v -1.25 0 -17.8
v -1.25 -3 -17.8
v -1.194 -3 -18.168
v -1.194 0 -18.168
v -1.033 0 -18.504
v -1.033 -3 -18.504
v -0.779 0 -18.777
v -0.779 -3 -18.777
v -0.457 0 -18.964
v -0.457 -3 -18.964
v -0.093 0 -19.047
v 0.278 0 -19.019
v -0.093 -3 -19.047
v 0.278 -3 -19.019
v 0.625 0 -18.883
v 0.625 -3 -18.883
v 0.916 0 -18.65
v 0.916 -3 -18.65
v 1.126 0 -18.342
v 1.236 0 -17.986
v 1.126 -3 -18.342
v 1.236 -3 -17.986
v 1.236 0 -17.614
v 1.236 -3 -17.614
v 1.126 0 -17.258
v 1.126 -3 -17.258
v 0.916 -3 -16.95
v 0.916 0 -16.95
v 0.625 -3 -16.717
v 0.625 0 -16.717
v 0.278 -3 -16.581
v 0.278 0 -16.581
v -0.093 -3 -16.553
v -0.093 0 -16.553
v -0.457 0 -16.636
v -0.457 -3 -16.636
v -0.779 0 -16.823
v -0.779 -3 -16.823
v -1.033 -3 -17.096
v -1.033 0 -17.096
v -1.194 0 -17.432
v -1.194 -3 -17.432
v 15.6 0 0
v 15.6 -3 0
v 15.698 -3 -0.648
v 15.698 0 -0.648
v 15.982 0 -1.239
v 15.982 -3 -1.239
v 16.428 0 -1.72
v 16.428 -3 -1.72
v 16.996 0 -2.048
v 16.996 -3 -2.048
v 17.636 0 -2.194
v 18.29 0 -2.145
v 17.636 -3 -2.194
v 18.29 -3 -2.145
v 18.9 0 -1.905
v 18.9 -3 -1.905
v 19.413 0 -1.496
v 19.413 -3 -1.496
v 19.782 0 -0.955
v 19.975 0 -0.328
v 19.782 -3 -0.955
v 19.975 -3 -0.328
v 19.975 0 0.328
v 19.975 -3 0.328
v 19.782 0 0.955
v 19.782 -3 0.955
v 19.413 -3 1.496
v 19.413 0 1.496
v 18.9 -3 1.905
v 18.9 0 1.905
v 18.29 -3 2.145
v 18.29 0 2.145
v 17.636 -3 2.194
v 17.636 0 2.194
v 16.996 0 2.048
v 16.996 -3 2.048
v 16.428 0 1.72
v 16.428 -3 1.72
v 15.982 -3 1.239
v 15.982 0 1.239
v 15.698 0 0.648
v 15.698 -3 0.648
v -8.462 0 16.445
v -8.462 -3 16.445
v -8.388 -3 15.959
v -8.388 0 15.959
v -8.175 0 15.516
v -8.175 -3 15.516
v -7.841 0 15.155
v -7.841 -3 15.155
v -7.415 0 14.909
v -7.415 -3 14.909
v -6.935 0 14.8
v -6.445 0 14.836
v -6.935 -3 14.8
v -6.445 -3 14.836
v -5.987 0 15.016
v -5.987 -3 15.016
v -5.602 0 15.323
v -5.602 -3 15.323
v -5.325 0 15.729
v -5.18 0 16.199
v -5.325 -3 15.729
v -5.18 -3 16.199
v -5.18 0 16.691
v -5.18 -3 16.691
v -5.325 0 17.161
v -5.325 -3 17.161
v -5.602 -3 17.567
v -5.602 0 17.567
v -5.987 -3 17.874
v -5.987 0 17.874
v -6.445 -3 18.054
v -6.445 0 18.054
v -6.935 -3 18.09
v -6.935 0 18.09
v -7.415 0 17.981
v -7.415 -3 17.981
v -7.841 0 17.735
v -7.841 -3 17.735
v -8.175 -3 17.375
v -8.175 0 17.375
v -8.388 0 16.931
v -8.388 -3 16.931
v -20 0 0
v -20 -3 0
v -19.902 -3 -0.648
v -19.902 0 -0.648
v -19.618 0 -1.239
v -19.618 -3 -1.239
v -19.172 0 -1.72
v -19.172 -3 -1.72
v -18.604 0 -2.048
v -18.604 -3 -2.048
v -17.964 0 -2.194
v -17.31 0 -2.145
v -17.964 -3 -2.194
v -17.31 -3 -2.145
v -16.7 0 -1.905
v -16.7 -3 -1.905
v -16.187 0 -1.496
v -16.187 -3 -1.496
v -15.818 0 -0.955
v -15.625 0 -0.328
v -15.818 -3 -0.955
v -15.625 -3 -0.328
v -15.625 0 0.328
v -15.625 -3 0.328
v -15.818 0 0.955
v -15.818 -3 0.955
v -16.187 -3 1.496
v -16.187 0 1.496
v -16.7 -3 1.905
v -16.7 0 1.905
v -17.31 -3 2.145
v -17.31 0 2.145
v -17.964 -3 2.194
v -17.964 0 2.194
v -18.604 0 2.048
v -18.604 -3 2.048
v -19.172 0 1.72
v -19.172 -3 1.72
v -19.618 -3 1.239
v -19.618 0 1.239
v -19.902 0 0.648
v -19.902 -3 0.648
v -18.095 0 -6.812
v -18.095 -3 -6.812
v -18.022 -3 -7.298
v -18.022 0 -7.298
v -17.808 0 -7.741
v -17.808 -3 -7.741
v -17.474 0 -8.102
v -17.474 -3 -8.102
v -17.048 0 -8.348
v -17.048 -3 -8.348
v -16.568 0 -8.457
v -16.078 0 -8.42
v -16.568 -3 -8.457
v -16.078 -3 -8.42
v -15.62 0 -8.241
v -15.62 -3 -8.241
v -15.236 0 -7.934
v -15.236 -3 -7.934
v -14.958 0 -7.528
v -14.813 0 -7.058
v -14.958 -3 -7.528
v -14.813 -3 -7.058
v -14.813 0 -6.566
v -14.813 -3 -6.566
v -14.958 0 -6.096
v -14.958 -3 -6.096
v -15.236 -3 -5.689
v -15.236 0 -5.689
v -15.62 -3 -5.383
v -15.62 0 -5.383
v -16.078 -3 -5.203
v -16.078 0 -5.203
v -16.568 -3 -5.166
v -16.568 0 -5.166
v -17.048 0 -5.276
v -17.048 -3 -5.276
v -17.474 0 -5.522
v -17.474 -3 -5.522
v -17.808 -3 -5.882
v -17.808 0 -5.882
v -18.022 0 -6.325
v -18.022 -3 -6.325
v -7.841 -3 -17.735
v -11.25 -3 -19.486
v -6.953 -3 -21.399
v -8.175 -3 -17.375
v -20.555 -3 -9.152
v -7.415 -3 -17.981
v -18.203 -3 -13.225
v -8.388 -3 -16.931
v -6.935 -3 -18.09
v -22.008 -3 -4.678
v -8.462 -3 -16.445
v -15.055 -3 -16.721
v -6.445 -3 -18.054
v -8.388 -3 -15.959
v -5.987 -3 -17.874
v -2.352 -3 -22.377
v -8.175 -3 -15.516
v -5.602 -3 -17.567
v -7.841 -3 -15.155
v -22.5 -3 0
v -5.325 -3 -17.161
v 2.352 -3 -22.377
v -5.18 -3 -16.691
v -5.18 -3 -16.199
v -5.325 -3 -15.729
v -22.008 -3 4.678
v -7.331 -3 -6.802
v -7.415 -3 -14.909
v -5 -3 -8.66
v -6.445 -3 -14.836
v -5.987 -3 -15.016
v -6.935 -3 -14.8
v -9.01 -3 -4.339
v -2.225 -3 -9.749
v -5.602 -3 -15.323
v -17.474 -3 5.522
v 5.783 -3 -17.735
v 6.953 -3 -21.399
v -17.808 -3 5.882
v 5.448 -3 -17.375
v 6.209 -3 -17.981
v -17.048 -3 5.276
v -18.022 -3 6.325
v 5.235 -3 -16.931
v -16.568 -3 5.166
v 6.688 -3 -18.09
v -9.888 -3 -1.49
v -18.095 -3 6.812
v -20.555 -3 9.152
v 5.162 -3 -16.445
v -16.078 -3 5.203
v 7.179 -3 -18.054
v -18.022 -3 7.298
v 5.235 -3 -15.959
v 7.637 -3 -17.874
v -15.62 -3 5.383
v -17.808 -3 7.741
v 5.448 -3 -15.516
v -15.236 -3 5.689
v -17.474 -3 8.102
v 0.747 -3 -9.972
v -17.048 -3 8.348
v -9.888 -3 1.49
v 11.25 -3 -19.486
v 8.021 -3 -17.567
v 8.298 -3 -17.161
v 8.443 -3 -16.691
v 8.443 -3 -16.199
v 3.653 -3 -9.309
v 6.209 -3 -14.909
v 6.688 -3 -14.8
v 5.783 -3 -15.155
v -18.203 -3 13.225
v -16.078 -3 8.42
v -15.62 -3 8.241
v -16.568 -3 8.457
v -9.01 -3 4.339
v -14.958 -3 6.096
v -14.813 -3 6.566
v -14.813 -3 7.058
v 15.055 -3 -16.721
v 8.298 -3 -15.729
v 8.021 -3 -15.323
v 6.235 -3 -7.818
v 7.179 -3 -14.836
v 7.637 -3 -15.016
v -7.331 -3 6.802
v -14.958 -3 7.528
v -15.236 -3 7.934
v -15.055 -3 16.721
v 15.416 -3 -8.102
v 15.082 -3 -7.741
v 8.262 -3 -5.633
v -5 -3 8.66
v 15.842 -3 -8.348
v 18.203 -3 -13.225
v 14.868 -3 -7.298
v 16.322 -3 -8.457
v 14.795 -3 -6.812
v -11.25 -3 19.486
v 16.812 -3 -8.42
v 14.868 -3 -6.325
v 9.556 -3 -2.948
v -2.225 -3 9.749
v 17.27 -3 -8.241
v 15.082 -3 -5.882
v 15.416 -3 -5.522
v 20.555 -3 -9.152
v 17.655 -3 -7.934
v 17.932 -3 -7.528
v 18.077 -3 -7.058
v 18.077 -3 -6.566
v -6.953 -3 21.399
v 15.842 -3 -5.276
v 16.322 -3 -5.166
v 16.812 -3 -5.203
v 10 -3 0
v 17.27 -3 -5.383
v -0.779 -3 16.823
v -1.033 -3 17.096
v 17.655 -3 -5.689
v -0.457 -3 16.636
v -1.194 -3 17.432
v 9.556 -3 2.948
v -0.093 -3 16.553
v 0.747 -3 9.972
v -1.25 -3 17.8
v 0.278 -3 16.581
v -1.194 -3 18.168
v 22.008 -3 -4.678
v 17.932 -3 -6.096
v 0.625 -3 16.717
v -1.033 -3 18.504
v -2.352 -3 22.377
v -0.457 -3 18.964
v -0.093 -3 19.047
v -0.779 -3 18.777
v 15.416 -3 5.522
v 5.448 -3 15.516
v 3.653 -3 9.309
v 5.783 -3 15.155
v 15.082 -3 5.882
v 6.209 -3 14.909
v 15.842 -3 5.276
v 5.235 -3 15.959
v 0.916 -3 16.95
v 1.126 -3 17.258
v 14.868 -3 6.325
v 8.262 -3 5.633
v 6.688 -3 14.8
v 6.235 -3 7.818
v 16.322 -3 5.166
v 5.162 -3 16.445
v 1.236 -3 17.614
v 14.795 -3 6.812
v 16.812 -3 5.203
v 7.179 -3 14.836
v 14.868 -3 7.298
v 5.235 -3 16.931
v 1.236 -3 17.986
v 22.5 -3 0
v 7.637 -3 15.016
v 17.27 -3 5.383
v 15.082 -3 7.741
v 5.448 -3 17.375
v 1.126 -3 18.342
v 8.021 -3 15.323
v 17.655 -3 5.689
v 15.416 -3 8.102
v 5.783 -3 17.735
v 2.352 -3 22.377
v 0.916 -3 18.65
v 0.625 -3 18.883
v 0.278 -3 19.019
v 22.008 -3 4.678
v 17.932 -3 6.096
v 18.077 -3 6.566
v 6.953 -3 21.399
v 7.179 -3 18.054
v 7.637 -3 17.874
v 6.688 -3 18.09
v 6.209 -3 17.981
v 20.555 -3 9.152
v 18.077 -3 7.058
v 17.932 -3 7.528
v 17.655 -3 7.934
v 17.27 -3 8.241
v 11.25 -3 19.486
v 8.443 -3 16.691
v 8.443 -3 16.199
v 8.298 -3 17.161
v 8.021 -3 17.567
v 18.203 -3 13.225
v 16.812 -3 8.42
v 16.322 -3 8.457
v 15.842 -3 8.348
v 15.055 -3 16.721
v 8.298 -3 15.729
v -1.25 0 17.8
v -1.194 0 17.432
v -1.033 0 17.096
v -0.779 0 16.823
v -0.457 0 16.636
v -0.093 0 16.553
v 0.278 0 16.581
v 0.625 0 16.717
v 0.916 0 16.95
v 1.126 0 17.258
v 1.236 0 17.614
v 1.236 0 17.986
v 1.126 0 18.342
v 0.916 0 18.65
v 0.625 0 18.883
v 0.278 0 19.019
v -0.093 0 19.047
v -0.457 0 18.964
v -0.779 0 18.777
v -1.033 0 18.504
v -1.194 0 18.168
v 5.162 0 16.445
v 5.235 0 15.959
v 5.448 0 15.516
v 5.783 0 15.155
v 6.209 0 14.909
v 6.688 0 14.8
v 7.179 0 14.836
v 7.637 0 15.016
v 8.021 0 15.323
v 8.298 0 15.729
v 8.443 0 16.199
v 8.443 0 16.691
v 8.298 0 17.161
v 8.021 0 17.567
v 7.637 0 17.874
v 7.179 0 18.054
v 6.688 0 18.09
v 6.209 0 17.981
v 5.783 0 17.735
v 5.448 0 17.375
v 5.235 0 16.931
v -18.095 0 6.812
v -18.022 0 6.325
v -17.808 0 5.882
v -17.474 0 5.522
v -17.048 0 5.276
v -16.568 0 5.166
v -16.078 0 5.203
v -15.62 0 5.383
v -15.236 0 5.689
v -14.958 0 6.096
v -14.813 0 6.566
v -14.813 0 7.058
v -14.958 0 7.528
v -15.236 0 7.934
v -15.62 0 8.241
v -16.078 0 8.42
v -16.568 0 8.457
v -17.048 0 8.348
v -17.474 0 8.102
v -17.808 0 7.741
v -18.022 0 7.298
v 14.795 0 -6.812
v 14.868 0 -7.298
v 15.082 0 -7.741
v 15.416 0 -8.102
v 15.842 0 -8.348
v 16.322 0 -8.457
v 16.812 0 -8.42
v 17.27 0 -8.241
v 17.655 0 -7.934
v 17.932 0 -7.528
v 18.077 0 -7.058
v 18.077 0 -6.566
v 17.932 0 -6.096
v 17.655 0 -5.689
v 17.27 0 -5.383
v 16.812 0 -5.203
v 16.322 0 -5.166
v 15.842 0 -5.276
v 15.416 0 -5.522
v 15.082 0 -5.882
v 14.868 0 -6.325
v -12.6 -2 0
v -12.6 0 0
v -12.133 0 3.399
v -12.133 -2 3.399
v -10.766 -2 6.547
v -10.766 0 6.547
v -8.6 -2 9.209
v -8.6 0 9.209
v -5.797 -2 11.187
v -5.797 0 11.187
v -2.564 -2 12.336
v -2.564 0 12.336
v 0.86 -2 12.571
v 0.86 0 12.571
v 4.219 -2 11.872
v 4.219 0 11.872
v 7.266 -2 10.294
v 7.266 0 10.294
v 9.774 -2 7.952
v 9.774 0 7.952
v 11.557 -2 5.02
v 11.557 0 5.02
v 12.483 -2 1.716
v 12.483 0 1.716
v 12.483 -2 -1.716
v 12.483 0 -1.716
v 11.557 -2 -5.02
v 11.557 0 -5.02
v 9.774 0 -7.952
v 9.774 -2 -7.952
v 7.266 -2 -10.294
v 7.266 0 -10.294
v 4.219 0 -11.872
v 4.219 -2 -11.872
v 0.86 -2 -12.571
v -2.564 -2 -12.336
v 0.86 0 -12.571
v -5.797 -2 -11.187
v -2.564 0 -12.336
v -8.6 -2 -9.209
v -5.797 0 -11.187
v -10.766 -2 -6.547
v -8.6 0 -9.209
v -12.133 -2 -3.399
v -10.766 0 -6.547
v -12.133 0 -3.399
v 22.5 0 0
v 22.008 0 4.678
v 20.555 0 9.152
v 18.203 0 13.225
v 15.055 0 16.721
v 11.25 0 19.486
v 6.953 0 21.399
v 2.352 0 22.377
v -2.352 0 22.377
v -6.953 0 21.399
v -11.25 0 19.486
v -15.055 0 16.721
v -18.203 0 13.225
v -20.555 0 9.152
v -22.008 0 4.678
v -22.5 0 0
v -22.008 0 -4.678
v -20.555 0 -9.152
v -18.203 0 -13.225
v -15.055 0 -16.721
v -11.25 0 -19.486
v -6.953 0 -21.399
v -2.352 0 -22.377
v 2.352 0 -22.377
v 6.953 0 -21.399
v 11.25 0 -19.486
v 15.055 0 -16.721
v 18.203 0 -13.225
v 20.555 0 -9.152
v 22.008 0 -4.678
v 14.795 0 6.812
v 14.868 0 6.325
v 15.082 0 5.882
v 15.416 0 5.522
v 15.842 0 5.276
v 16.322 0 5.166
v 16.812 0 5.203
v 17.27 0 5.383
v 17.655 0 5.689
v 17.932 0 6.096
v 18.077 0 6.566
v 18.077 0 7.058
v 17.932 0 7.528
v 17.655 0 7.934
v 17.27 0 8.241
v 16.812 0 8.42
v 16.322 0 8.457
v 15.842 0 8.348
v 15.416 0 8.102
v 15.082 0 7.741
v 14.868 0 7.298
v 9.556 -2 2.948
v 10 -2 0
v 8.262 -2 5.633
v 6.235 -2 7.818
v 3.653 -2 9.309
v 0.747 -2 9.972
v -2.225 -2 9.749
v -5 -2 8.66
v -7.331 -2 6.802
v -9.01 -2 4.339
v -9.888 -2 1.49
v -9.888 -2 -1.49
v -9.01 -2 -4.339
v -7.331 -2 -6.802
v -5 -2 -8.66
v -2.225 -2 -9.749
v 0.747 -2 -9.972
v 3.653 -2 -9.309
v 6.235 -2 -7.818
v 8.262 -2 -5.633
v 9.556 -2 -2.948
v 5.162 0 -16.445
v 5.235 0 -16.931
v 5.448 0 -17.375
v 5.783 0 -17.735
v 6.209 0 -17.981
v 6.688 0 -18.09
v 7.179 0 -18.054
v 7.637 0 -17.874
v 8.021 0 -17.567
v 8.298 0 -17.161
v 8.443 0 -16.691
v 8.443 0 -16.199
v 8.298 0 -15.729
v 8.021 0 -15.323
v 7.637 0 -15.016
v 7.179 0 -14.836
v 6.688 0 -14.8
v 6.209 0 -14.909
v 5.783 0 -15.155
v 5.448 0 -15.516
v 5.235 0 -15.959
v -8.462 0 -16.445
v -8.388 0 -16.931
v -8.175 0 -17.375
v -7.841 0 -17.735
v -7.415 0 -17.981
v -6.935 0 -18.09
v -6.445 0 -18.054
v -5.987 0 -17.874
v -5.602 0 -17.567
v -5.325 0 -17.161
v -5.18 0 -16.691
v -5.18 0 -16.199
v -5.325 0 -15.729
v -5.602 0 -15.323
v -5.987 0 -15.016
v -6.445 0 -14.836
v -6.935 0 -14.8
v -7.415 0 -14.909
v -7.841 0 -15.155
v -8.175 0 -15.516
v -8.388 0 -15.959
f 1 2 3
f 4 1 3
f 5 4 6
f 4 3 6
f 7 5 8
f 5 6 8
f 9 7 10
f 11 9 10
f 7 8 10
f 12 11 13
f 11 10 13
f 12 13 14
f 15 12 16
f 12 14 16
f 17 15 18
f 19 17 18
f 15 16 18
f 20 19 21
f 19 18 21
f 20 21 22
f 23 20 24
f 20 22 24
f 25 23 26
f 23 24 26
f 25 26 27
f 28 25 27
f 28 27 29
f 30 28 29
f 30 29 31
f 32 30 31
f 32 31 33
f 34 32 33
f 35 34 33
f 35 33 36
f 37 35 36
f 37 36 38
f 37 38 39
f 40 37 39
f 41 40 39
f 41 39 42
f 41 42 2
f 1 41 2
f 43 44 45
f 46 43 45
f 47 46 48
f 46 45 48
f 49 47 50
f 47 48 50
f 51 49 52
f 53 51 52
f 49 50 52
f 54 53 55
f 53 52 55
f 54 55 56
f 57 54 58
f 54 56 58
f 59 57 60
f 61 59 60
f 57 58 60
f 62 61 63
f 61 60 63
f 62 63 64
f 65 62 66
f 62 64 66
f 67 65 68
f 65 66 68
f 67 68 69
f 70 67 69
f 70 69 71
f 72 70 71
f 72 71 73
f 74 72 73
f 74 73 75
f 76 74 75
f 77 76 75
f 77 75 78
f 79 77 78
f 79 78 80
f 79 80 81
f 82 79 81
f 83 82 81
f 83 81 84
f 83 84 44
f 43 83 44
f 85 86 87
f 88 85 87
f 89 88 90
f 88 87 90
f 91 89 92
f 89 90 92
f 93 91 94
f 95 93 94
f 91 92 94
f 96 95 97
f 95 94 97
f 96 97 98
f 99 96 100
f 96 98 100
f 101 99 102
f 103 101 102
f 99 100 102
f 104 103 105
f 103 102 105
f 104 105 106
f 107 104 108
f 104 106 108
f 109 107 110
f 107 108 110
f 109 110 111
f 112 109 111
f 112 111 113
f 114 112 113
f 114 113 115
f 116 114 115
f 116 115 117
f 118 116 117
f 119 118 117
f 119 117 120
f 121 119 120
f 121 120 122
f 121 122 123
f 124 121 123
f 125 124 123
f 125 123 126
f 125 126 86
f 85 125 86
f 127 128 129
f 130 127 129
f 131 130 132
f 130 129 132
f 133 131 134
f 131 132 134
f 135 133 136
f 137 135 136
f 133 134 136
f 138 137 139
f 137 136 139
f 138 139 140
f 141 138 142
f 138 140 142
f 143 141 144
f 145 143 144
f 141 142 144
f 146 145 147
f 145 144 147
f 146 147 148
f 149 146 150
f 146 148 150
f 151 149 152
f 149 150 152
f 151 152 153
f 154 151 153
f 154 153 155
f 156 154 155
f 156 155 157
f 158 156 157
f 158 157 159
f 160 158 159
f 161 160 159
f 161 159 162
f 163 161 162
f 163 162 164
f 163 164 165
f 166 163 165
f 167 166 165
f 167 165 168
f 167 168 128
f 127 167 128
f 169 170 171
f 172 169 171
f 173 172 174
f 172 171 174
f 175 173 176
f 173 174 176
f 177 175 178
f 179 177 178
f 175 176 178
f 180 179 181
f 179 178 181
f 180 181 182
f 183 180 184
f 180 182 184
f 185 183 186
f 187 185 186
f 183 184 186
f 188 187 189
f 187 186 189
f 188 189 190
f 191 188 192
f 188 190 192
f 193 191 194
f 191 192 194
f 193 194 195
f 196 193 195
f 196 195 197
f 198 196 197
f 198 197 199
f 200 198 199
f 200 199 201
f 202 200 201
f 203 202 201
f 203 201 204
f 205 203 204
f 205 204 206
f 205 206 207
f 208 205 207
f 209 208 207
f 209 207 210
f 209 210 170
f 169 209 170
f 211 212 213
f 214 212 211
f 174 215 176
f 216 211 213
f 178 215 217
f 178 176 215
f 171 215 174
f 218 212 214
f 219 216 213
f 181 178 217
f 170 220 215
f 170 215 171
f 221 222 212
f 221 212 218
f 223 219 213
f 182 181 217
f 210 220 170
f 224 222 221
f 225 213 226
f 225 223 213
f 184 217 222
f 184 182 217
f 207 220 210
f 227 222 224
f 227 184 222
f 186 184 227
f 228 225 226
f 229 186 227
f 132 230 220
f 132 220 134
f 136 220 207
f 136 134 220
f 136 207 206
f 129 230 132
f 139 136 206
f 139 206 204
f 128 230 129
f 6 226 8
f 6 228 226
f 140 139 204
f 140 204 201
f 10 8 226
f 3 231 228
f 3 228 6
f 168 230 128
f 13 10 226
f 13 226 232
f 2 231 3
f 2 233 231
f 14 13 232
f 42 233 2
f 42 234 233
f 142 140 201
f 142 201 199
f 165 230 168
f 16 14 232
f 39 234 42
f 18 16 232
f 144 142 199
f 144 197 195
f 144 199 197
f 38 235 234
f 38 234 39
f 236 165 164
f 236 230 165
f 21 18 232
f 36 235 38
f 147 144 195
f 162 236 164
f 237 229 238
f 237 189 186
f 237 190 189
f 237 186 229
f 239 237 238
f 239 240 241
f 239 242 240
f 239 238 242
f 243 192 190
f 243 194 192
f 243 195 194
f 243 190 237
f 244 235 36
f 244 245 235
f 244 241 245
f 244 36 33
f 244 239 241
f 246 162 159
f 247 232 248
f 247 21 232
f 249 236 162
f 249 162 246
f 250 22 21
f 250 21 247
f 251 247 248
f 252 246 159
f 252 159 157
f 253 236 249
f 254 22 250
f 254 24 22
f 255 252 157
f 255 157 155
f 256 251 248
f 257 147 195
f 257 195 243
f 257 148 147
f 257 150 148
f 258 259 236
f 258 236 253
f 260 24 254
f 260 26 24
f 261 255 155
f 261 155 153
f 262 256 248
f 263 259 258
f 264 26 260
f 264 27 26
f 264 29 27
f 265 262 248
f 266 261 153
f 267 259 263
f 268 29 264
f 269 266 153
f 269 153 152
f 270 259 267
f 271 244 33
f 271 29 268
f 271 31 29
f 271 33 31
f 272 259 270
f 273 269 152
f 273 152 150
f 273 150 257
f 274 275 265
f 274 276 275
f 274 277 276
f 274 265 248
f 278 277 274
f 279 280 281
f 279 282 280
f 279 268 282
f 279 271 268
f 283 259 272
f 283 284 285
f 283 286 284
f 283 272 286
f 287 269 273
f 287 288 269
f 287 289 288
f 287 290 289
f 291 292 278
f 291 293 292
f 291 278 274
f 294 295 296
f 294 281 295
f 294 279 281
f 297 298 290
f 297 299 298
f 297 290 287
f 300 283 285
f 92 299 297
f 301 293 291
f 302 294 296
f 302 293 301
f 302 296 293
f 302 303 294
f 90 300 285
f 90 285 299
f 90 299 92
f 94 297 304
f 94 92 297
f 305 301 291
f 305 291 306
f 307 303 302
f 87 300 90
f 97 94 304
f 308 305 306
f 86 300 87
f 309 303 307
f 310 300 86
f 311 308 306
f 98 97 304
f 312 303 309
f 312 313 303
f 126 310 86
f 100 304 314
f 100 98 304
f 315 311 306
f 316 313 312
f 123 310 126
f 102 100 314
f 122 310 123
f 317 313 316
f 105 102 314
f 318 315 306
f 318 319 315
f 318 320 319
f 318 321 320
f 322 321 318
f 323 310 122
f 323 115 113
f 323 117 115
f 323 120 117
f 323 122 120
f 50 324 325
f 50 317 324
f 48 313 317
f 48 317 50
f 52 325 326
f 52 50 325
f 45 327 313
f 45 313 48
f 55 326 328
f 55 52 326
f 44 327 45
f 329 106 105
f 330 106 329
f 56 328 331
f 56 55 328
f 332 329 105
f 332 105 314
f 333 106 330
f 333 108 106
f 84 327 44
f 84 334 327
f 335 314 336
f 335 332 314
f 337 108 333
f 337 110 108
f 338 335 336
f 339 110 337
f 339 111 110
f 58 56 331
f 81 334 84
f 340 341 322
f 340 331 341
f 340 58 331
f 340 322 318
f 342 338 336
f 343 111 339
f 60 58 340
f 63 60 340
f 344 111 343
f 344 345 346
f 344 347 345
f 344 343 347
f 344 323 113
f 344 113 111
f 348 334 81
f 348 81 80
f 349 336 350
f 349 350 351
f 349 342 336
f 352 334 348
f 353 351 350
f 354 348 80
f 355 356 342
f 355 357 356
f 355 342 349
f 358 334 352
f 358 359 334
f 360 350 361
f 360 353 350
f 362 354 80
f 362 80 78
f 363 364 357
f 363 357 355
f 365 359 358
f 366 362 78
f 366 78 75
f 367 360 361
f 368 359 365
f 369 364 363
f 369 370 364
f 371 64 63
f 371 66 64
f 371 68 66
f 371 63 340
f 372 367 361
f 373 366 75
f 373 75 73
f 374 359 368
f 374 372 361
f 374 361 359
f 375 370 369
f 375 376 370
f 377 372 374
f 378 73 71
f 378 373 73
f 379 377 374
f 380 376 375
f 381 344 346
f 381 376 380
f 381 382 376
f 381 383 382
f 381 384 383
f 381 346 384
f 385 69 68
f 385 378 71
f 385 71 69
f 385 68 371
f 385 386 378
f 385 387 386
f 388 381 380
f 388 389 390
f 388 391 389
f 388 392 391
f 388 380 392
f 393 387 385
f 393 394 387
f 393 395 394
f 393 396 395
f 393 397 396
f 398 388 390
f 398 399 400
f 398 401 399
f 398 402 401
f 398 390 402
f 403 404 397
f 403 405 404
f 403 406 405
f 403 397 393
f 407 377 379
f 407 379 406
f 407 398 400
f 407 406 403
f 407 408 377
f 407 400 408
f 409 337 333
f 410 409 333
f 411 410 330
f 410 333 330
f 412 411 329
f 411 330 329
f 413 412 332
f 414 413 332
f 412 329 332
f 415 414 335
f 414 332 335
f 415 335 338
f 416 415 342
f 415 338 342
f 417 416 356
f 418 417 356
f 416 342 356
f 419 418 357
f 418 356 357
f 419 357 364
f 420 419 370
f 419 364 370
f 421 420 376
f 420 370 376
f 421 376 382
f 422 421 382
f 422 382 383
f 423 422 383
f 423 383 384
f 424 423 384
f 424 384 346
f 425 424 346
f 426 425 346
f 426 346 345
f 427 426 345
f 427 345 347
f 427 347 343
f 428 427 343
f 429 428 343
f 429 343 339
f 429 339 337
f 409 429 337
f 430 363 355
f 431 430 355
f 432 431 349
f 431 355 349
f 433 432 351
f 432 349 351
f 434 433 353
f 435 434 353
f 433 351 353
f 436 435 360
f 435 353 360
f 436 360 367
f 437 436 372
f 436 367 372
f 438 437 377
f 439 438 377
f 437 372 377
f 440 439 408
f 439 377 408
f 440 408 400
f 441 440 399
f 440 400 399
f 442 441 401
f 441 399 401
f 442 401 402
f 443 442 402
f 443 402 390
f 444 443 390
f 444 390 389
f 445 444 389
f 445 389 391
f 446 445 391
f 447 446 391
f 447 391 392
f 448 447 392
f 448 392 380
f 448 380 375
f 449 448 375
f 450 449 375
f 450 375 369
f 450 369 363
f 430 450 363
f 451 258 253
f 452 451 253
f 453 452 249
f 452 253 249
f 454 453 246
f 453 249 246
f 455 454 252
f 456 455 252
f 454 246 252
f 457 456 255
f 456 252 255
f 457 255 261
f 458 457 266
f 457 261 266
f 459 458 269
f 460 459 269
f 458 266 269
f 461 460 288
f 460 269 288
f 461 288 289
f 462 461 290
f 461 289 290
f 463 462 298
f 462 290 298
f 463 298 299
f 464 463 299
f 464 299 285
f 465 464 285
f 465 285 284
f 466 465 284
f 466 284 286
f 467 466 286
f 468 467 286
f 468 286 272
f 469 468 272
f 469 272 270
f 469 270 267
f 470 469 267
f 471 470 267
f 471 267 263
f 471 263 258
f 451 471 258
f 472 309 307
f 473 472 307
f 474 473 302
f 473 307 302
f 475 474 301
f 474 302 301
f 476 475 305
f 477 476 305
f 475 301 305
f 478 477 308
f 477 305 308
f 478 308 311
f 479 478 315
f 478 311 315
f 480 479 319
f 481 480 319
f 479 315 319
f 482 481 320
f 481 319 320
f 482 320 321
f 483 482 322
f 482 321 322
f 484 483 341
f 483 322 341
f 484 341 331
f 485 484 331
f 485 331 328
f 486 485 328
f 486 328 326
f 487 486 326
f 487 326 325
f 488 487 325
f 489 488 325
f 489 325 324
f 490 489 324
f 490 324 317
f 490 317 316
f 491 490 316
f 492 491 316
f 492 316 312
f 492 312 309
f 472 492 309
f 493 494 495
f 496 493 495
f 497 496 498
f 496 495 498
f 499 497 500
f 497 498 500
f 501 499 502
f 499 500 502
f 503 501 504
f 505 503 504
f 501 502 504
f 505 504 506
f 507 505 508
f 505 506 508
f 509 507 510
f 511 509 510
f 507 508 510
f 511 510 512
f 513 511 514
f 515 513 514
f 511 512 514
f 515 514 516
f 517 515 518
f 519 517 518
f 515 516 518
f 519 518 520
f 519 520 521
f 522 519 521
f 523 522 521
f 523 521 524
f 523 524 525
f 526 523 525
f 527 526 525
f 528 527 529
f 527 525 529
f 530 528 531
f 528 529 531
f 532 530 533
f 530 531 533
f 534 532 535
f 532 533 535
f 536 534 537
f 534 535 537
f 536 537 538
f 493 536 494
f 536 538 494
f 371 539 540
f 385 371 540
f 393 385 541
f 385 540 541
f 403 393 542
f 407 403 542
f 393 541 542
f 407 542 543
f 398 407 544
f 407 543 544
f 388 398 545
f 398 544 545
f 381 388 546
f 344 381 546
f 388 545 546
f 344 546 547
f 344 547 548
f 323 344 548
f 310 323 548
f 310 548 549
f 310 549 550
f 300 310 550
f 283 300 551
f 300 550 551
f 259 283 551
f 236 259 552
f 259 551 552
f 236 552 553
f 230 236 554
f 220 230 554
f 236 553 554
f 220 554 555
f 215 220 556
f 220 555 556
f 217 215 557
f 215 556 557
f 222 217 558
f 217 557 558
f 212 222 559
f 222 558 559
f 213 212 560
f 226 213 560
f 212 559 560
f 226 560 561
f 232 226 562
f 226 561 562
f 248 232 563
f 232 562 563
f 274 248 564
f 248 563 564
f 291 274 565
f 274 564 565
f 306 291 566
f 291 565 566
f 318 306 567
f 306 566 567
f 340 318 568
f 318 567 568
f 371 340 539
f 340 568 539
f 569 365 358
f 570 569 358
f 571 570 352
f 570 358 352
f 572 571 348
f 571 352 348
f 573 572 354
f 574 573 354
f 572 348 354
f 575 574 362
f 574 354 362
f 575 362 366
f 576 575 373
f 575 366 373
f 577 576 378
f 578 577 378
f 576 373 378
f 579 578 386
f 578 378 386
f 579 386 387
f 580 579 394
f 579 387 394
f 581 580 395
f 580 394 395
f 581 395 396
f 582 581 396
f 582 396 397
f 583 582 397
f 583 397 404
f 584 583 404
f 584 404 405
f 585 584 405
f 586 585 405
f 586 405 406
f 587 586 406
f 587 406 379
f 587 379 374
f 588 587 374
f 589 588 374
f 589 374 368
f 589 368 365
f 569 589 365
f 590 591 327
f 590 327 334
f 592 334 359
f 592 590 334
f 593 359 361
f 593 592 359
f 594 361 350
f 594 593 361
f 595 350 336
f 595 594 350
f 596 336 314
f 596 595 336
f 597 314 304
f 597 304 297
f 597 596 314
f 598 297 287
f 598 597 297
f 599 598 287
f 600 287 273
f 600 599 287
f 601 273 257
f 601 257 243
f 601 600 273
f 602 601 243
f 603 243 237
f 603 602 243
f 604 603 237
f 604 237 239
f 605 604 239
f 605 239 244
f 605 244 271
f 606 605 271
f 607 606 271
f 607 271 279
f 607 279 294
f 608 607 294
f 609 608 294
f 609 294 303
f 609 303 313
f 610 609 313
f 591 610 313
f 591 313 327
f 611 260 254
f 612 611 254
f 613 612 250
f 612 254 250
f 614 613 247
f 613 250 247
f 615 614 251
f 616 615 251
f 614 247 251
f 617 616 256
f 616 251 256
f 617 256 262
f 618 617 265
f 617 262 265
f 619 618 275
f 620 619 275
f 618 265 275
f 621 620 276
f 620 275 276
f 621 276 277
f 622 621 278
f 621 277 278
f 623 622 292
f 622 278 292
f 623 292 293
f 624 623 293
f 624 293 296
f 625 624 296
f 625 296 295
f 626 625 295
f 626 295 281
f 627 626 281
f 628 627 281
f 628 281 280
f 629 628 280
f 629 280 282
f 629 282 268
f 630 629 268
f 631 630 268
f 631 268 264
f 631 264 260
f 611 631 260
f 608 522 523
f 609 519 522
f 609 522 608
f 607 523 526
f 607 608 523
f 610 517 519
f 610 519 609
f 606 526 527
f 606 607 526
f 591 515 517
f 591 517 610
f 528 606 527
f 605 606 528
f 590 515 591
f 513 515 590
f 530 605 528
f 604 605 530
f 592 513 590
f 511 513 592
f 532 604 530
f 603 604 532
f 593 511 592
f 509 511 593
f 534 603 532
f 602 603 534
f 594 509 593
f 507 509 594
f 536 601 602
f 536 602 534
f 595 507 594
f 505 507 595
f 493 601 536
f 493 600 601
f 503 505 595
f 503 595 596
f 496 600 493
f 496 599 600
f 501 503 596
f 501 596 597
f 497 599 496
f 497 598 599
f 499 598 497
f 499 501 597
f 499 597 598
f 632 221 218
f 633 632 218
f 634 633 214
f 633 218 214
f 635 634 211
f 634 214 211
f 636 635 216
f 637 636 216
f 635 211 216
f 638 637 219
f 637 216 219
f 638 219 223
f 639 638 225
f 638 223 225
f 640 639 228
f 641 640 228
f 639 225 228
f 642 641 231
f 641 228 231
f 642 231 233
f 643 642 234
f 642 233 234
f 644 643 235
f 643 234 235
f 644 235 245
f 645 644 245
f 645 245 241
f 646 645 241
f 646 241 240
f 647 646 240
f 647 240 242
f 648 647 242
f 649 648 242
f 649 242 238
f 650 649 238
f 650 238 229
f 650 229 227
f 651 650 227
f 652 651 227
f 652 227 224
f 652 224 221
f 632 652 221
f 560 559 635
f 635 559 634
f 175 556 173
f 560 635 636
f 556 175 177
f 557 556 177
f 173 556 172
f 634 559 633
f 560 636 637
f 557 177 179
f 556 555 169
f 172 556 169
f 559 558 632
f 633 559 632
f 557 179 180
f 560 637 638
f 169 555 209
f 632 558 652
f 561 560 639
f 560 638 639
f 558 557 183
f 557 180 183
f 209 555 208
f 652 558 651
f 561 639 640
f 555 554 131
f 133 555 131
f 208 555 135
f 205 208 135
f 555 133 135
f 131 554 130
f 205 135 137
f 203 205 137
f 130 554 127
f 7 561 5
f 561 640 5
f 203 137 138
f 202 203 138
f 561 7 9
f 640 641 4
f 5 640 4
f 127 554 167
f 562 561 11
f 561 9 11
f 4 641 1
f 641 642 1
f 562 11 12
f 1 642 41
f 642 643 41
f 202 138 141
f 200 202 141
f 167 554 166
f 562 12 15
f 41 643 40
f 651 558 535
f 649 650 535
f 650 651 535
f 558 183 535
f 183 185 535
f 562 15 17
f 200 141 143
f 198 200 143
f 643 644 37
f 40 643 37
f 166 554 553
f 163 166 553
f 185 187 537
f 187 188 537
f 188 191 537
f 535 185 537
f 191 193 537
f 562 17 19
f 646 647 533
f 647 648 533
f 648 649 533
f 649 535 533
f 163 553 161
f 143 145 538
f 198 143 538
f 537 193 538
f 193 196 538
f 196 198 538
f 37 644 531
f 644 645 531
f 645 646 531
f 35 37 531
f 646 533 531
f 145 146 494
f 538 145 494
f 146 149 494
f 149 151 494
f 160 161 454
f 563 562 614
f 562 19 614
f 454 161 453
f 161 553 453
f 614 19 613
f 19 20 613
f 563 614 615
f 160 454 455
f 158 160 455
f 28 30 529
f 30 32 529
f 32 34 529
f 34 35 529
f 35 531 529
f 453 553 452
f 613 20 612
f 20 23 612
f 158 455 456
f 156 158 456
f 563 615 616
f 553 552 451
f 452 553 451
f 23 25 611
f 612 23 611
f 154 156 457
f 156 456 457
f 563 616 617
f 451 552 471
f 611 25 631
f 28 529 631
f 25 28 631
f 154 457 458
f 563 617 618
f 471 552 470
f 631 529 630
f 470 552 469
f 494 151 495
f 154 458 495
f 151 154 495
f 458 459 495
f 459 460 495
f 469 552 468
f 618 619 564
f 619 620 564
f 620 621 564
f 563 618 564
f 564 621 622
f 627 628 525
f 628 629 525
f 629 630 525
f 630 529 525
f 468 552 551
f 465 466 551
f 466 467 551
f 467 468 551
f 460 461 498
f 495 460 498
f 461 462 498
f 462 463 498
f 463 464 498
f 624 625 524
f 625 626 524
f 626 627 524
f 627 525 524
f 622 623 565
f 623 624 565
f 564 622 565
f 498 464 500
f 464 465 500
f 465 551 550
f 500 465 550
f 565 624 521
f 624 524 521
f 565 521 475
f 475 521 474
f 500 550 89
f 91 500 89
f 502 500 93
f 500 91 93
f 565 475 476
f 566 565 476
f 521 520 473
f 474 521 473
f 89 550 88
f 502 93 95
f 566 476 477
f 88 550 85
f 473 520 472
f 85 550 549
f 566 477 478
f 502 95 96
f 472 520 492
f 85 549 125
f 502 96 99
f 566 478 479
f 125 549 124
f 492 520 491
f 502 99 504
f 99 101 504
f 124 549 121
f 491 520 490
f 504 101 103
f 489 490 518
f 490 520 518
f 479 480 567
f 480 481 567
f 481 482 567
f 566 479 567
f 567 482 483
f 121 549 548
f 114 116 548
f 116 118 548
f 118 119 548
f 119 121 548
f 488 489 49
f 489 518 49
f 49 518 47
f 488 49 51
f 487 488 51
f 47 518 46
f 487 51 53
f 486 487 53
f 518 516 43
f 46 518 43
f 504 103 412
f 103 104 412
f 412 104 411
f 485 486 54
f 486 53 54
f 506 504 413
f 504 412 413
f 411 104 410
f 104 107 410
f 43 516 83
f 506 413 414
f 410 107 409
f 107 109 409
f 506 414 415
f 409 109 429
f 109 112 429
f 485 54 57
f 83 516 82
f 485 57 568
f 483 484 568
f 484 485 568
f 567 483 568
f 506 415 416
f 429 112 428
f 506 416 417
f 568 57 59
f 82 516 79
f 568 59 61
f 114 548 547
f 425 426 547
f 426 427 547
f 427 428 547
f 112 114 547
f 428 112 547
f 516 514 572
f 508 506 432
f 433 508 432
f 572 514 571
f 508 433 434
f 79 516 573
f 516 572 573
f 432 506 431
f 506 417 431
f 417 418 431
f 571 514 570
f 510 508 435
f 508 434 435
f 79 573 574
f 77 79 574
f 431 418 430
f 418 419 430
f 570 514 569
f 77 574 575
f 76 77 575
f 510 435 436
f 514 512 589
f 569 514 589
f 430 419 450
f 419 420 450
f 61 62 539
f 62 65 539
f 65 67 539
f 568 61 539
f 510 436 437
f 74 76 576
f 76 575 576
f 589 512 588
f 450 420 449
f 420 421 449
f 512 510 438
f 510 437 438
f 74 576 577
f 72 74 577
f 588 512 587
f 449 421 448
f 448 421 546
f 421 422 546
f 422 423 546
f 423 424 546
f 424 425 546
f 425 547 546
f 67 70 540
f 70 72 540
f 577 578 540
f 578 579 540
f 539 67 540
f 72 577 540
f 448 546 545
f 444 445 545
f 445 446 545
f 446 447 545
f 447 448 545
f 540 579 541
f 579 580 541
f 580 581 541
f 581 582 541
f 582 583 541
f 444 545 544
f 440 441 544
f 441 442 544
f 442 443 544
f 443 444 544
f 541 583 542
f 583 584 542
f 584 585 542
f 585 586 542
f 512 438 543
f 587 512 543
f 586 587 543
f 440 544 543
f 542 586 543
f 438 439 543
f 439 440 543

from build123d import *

# Parameters (mm, degrees)
F0_R     = 22.5
F0_R_2   = 10
F1_DEPTH = 3
F2_D     = 3.3
F3_D     = 4.4
F4_R     = 12.6
F4_R_2   = 10
F5_DEPTH = 2
F6_D     = 2.5


with BuildPart() as f1:
    # F0 (on Front) → F1 (new body)
    with BuildSketch(Plane.XZ):
        Circle(F0_R)
        Circle(F0_R_2, mode=Mode.SUBTRACT)
    extrude(amount=F1_DEPTH)

    # F2 (through all)
    with Locations(Plane(origin=(0, 0, 0), x_dir=(1, 0, 0), z_dir=(0, 1, 0))):
        with Locations((-16.4450556787, -6.8117650961), (-6.8117650961, -16.4450556787), (6.8117650961, -16.4450556787), (16.4450556787, -6.8117650961), (16.4450556787, 6.8117650961), (6.8117650961, 16.4450556787), (-6.8117650961, 16.4450556787), (-16.4450556787, 6.8117650961)):
            Hole(F2_D / 2)

    # F3 (through all)
    with Locations(Plane(origin=(0, 0, 0), x_dir=(1, 0, 0), z_dir=(0, 1, 0))):
        with Locations((-17.8, 0), (17.8, 0)):
            Hole(F3_D / 2)

    # F4 (on face) → F5 (cut)
    with BuildSketch(Plane(origin=(0, 0, 0), x_dir=(-1, 0, 0), z_dir=(0, 1, 0))):
        Circle(F4_R)
        Circle(F4_R_2, mode=Mode.SUBTRACT)
    extrude(amount=-F5_DEPTH, mode=Mode.SUBTRACT)

    # F6 (through all)
    with Locations(Plane(origin=(0, 0, 0), x_dir=(1, 0, 0), z_dir=(0, 1, 0))):
        with Locations((0, -17.8), (0, 17.8)):
            Hole(F6_D / 2)


solid = f1.part
